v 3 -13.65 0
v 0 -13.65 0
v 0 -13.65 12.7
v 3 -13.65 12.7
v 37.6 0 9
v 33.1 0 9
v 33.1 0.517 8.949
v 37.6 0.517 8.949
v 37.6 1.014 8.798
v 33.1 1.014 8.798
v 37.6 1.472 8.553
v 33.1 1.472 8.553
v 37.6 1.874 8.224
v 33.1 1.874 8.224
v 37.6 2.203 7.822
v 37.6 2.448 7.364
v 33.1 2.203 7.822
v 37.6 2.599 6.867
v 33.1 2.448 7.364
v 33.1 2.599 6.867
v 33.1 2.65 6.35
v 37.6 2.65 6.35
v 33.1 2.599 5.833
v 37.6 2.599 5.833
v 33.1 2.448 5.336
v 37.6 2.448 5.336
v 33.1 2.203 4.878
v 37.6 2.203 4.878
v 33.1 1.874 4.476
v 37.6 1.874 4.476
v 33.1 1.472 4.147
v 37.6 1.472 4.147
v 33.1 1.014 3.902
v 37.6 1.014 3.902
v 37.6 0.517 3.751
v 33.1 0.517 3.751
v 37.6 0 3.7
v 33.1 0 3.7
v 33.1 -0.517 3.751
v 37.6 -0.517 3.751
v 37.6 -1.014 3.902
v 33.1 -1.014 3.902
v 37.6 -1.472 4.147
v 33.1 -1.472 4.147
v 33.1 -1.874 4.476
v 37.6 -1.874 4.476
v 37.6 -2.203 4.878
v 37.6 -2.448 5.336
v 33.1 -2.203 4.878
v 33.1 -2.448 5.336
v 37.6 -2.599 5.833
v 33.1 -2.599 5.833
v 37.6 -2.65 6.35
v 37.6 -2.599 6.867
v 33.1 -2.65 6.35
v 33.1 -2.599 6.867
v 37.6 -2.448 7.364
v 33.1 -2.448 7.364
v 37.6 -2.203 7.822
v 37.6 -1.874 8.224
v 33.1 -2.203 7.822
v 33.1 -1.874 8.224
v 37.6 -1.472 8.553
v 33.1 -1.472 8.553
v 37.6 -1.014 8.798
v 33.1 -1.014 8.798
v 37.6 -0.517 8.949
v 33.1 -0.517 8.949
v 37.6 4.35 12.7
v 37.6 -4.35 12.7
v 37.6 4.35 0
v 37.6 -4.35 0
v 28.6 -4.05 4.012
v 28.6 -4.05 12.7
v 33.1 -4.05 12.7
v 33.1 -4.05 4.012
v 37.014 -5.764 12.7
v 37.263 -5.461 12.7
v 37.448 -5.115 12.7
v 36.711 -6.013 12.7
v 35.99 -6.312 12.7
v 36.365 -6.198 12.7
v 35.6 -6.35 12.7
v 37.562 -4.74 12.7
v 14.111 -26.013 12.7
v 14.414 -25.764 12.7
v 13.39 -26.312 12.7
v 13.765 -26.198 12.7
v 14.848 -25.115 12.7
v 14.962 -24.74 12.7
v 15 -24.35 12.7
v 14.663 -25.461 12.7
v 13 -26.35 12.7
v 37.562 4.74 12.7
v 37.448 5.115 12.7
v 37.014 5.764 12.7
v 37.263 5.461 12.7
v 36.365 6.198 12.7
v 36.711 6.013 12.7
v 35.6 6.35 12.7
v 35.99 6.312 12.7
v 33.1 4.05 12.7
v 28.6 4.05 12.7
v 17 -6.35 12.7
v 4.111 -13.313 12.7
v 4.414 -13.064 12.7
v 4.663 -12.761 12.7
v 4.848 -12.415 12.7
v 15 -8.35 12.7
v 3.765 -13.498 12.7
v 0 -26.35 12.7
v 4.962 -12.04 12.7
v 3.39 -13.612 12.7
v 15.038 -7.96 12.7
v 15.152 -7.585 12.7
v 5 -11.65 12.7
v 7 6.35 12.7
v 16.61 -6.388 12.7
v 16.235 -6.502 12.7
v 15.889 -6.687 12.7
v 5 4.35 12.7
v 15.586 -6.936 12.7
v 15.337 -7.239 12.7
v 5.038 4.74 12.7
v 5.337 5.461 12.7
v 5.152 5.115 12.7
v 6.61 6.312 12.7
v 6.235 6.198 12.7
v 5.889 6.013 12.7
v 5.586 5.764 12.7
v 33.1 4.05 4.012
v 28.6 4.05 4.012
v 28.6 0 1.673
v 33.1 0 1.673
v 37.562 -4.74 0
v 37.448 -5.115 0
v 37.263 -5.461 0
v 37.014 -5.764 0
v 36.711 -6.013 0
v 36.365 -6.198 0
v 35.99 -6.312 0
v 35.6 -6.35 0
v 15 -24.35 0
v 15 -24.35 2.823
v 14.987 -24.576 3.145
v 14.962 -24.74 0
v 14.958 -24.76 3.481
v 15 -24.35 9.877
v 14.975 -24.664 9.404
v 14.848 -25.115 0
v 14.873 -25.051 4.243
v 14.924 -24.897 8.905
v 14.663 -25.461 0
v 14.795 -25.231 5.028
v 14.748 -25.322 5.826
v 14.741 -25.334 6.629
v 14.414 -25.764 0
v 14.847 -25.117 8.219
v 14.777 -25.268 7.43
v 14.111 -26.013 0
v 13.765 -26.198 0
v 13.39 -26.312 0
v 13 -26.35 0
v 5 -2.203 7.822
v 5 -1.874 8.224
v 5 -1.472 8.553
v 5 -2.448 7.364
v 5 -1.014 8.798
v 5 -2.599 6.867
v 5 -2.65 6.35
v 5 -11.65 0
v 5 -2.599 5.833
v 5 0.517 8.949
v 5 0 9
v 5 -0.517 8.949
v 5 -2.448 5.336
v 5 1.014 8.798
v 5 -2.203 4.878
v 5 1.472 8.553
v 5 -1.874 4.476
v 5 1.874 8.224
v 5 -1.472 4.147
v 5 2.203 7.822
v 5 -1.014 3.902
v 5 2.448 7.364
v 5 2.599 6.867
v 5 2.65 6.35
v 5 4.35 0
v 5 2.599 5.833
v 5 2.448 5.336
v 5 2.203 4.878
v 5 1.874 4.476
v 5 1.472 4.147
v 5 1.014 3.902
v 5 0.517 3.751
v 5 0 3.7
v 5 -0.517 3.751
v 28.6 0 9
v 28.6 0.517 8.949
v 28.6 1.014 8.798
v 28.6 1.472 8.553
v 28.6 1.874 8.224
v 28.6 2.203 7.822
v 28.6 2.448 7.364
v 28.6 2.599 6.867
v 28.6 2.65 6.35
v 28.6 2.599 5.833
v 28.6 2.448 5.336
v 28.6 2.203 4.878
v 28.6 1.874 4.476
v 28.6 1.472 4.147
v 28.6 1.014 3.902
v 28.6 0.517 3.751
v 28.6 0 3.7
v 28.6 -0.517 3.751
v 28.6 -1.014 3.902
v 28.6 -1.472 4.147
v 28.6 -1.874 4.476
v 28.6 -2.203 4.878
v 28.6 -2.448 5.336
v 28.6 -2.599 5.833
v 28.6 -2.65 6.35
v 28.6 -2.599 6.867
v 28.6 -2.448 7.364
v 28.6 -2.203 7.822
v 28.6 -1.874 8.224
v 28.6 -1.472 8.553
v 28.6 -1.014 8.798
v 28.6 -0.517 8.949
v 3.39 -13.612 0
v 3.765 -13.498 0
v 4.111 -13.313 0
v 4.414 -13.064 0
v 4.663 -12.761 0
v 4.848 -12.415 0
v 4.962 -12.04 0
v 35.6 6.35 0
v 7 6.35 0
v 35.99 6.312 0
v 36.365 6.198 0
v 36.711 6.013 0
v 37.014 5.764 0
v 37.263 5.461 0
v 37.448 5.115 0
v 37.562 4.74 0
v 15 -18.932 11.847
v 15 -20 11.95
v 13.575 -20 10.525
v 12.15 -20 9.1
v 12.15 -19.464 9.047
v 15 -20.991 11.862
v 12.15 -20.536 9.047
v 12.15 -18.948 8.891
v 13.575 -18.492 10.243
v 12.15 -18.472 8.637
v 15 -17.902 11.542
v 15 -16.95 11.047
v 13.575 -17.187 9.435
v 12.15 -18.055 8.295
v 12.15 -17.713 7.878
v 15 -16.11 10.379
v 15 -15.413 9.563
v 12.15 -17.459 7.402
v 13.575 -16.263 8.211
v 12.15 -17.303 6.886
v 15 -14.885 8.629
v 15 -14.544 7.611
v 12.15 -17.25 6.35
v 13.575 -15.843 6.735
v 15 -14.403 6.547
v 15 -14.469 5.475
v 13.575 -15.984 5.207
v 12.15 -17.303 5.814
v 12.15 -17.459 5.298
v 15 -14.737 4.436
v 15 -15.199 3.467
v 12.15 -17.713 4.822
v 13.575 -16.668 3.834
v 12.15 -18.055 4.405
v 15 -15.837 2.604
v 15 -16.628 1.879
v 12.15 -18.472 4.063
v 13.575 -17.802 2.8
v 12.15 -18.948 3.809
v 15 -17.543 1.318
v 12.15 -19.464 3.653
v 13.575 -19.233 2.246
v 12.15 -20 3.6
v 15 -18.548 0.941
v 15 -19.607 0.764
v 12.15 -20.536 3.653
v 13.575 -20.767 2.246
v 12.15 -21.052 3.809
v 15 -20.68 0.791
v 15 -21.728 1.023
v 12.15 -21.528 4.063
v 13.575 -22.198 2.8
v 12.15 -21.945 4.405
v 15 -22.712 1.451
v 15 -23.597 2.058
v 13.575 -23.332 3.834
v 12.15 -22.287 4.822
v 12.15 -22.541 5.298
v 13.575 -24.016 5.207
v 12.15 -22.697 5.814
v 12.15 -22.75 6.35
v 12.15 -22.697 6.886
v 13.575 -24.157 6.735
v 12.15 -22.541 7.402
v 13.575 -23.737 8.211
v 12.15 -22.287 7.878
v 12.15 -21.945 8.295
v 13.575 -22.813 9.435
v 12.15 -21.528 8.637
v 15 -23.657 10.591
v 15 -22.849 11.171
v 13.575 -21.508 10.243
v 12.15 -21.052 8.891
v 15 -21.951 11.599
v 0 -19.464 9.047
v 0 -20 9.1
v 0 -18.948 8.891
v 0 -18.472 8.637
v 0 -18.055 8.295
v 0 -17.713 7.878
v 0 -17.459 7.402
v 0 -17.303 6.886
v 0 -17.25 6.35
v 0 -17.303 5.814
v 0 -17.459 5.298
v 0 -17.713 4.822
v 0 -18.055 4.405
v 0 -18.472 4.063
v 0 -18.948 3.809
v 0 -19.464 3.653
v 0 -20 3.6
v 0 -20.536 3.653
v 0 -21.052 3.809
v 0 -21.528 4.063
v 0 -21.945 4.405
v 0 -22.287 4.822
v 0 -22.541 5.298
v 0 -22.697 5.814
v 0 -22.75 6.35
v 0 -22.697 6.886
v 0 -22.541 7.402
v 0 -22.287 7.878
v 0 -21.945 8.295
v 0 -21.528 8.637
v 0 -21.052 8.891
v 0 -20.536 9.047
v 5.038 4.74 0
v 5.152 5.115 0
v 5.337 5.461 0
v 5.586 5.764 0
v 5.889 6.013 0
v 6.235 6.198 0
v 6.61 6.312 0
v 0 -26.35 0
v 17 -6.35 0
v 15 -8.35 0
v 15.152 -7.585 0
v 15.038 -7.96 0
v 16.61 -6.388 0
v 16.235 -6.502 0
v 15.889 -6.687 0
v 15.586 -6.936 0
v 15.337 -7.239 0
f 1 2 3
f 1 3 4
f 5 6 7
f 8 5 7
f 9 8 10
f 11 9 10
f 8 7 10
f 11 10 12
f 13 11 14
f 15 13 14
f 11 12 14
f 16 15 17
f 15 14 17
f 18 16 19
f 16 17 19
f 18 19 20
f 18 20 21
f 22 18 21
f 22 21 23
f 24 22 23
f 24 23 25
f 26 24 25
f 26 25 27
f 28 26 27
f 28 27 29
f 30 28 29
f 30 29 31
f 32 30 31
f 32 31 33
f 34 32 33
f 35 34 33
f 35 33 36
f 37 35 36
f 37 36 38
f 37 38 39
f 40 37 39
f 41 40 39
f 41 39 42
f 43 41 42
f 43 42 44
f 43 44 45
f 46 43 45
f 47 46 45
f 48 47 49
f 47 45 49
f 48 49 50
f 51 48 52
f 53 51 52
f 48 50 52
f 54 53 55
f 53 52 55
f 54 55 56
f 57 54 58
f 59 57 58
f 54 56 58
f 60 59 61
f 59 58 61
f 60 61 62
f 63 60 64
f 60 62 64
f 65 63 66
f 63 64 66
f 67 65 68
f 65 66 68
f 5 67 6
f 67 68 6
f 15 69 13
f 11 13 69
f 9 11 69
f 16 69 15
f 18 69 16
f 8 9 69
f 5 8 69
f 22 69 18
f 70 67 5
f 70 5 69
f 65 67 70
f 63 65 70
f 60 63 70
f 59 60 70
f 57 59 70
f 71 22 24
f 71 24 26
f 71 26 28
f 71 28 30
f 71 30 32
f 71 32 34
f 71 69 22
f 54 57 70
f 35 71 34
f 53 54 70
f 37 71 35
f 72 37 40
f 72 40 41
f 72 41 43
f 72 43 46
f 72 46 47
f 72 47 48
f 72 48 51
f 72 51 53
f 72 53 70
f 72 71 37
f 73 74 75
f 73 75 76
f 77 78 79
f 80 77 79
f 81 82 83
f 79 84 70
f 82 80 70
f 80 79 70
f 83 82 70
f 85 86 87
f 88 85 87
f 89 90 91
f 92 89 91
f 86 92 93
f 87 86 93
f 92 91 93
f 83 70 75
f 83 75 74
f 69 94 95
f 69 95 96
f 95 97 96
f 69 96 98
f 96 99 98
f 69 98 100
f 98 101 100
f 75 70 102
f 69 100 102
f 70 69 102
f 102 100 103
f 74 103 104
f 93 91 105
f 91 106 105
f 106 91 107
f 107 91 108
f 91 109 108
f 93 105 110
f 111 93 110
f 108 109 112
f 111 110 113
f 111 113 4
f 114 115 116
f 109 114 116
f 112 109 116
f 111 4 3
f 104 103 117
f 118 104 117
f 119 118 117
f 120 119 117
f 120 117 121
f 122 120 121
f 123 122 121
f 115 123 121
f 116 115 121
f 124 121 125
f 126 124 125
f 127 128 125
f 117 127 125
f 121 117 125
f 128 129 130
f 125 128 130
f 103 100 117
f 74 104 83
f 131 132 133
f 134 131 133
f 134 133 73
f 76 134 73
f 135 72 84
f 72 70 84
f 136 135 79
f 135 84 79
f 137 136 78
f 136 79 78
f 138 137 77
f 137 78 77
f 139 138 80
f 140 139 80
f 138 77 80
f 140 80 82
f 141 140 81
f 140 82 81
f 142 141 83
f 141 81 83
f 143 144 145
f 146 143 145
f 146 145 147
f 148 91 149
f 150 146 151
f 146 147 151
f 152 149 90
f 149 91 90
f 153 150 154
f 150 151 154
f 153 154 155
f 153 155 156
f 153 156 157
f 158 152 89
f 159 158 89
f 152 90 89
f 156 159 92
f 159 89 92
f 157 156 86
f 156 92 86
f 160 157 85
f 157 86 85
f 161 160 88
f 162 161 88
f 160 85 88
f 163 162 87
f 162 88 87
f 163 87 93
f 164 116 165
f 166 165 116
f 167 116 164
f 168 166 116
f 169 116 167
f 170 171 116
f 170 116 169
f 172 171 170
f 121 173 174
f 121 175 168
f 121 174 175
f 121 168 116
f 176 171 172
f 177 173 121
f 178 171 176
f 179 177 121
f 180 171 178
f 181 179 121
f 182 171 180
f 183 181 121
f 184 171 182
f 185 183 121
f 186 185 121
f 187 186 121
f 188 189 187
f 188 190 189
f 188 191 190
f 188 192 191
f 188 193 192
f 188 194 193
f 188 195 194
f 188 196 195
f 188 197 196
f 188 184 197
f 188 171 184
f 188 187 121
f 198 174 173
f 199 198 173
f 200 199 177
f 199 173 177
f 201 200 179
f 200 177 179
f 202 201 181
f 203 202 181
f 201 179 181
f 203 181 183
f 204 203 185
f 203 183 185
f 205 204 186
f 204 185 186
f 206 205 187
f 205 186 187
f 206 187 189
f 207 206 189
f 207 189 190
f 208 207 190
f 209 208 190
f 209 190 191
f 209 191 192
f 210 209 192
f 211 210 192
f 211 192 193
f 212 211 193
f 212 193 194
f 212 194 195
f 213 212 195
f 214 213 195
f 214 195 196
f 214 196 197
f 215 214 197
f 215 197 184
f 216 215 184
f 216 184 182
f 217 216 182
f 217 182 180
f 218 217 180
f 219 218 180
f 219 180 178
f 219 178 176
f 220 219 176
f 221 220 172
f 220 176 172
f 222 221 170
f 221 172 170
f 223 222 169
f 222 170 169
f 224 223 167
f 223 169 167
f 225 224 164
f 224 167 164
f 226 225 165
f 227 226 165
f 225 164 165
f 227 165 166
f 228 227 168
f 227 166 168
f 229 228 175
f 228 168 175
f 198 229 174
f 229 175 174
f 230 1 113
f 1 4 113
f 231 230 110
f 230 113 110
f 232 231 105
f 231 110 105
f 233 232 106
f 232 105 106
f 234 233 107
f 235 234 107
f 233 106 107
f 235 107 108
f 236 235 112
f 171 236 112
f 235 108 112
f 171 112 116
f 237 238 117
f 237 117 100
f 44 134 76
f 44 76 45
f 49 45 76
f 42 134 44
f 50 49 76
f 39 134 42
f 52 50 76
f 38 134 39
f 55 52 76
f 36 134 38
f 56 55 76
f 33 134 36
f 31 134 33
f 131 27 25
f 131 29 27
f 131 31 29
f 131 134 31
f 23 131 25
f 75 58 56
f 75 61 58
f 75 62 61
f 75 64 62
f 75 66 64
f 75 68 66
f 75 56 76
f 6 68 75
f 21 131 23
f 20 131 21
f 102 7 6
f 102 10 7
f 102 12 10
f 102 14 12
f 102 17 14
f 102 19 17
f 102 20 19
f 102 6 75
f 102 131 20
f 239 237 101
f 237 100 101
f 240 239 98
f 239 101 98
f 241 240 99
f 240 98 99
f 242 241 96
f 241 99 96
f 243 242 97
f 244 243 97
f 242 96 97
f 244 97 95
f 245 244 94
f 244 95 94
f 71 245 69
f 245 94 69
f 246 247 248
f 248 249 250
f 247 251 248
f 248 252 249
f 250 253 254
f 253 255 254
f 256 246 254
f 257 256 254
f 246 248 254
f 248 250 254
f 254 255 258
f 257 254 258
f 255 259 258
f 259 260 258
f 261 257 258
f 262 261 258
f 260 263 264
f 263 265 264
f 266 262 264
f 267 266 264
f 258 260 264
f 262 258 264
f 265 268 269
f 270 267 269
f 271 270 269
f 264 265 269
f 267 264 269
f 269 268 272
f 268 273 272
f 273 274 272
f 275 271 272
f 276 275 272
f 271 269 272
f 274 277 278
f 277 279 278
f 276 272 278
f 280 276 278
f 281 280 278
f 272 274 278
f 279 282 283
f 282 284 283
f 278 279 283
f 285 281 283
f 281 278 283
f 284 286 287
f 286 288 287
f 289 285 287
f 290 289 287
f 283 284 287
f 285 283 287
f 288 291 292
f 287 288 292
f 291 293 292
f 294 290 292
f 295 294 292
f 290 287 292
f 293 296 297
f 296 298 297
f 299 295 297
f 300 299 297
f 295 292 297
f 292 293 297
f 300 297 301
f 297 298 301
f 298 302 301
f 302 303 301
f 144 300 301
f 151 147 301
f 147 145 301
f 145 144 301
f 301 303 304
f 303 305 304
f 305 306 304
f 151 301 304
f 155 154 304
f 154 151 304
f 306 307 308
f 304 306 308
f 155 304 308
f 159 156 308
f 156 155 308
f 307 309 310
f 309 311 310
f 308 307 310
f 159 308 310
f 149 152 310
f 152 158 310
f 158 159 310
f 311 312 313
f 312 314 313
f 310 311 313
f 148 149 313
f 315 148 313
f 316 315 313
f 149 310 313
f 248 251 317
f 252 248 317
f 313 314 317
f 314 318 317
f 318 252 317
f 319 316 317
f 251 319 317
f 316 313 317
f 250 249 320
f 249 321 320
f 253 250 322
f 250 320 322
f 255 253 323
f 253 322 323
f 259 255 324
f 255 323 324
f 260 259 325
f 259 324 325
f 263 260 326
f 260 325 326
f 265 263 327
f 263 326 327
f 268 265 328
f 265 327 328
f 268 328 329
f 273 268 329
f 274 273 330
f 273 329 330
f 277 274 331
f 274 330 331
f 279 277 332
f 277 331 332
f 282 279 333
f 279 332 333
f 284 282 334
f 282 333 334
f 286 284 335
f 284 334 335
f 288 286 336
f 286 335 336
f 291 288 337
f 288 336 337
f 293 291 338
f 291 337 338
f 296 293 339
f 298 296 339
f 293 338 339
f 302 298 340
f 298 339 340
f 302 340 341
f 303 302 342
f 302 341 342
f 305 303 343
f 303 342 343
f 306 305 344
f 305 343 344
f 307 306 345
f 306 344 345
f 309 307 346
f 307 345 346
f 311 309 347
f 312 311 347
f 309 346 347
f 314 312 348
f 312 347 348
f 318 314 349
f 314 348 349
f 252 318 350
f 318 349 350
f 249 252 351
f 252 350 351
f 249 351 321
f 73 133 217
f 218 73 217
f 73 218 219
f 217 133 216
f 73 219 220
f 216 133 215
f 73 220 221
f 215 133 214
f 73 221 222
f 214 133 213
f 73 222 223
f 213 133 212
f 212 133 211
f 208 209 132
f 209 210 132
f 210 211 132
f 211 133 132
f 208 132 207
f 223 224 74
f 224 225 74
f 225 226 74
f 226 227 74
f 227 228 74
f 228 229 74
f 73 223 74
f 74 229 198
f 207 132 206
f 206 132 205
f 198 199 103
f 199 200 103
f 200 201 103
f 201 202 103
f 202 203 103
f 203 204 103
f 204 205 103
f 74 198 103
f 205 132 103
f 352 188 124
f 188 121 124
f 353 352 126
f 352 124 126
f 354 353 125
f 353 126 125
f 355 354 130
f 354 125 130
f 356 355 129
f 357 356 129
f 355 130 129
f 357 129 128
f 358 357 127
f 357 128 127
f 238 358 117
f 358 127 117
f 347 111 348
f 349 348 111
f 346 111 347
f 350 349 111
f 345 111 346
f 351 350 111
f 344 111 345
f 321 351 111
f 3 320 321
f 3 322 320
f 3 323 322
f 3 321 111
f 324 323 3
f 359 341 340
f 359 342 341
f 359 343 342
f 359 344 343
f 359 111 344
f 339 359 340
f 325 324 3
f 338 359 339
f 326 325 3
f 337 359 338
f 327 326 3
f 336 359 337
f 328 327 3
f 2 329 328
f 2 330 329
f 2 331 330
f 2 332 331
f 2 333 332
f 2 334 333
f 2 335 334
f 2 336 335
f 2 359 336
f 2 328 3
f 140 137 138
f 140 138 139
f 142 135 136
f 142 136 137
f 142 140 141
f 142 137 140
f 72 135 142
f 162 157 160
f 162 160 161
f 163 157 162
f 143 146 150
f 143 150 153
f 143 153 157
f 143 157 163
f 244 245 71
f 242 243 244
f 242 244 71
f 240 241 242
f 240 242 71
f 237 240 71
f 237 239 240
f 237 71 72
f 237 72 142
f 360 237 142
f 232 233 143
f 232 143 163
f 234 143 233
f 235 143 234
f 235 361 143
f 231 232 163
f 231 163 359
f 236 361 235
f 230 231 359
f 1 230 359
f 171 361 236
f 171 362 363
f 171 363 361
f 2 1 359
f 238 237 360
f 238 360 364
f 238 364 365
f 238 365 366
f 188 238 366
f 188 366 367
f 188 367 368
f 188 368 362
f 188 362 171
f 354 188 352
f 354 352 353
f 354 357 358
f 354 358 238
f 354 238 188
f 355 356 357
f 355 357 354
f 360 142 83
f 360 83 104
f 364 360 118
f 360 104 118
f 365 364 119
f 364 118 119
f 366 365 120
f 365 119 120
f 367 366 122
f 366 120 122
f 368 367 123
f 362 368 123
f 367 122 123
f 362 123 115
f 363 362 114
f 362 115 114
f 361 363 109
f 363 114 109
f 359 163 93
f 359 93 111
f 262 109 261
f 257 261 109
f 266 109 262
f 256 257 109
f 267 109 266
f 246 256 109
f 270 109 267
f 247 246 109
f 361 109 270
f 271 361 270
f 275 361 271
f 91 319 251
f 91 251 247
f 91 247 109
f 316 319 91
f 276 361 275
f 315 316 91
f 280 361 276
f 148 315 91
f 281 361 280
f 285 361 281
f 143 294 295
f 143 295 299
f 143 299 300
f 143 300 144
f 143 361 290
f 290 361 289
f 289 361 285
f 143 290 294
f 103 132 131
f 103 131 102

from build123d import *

# Parameters (mm, degrees)
BOSS_EXTRUDE2_DEPTH           = 12.7
FILLET1_R                     = 2
CSK_FOR_M5_SFHCS1_D           = 5.5
CSK_FOR_M5_SFHCS1_CSINK_D     = 11.2
CSK_FOR_M5_SFHCS1_CSINK_ANGLE = 90
M5_CLEARANCE_HOLE1_D          = 5.3
CUT_EXTRUDE1_DEPTH            = 4.5


with BuildPart() as part:
    # Sketch1 → Boss-Extrude2 (new body)
    with BuildSketch(Plane.XY):
        Polygon((0, -26.35), (0, -13.65), (5, -13.65), (5, 6.35), (37.6, 6.35), (37.6, -6.35), (15, -6.35), (15, -26.35), align=None)
    extrude(amount=BOSS_EXTRUDE2_DEPTH)

    # Fillet1
    fillet1_edges = [part.edges().sort_by_distance(p)[0] for p in [
        (5, -13.65, 6.35),
        (5, 6.35, 6.35),
        (37.6, 6.35, 6.35),
        (37.6, -6.35, 6.35),
        (15, -6.35, 6.35),
        (15, -26.35, 6.35),
    ]]
    fillet(fillet1_edges, radius=FILLET1_R)

    # CSK for M5 SFHCS1 (through all)
    with Locations(Plane(origin=(15, 0, 0), x_dir=(0, 0, -1), z_dir=(1, 0, 0))):
        with Locations((-6.35, -20)):
            CounterSinkHole(CSK_FOR_M5_SFHCS1_D / 2, CSK_FOR_M5_SFHCS1_CSINK_D / 2, counter_sink_angle=CSK_FOR_M5_SFHCS1_CSINK_ANGLE)

    # M5 Clearance Hole1 (through all)
    with Locations(Plane(origin=(37.6, 0, 0), x_dir=(0, 0, -1), z_dir=(1, 0, 0))):
        with Locations((-6.35, 0)):
            Hole(M5_CLEARANCE_HOLE1_D / 2)

    # Sketch8 → Cut-Extrude1 (cut)
    with BuildSketch(Plane(origin=(28.6, 0, 0), x_dir=(0, 0, -1), z_dir=(1, 0, 0))):
        Polygon((-12.7, 4.05), (-6.35, 4.05), (-4.01173141, 4.05), (-1.67346282, 0), (-4.01173141, -4.05), (-6.35, -4.05), (-12.7, -4.05), align=None)
    extrude(amount=CUT_EXTRUDE1_DEPTH, mode=Mode.SUBTRACT)


solid = part.part
